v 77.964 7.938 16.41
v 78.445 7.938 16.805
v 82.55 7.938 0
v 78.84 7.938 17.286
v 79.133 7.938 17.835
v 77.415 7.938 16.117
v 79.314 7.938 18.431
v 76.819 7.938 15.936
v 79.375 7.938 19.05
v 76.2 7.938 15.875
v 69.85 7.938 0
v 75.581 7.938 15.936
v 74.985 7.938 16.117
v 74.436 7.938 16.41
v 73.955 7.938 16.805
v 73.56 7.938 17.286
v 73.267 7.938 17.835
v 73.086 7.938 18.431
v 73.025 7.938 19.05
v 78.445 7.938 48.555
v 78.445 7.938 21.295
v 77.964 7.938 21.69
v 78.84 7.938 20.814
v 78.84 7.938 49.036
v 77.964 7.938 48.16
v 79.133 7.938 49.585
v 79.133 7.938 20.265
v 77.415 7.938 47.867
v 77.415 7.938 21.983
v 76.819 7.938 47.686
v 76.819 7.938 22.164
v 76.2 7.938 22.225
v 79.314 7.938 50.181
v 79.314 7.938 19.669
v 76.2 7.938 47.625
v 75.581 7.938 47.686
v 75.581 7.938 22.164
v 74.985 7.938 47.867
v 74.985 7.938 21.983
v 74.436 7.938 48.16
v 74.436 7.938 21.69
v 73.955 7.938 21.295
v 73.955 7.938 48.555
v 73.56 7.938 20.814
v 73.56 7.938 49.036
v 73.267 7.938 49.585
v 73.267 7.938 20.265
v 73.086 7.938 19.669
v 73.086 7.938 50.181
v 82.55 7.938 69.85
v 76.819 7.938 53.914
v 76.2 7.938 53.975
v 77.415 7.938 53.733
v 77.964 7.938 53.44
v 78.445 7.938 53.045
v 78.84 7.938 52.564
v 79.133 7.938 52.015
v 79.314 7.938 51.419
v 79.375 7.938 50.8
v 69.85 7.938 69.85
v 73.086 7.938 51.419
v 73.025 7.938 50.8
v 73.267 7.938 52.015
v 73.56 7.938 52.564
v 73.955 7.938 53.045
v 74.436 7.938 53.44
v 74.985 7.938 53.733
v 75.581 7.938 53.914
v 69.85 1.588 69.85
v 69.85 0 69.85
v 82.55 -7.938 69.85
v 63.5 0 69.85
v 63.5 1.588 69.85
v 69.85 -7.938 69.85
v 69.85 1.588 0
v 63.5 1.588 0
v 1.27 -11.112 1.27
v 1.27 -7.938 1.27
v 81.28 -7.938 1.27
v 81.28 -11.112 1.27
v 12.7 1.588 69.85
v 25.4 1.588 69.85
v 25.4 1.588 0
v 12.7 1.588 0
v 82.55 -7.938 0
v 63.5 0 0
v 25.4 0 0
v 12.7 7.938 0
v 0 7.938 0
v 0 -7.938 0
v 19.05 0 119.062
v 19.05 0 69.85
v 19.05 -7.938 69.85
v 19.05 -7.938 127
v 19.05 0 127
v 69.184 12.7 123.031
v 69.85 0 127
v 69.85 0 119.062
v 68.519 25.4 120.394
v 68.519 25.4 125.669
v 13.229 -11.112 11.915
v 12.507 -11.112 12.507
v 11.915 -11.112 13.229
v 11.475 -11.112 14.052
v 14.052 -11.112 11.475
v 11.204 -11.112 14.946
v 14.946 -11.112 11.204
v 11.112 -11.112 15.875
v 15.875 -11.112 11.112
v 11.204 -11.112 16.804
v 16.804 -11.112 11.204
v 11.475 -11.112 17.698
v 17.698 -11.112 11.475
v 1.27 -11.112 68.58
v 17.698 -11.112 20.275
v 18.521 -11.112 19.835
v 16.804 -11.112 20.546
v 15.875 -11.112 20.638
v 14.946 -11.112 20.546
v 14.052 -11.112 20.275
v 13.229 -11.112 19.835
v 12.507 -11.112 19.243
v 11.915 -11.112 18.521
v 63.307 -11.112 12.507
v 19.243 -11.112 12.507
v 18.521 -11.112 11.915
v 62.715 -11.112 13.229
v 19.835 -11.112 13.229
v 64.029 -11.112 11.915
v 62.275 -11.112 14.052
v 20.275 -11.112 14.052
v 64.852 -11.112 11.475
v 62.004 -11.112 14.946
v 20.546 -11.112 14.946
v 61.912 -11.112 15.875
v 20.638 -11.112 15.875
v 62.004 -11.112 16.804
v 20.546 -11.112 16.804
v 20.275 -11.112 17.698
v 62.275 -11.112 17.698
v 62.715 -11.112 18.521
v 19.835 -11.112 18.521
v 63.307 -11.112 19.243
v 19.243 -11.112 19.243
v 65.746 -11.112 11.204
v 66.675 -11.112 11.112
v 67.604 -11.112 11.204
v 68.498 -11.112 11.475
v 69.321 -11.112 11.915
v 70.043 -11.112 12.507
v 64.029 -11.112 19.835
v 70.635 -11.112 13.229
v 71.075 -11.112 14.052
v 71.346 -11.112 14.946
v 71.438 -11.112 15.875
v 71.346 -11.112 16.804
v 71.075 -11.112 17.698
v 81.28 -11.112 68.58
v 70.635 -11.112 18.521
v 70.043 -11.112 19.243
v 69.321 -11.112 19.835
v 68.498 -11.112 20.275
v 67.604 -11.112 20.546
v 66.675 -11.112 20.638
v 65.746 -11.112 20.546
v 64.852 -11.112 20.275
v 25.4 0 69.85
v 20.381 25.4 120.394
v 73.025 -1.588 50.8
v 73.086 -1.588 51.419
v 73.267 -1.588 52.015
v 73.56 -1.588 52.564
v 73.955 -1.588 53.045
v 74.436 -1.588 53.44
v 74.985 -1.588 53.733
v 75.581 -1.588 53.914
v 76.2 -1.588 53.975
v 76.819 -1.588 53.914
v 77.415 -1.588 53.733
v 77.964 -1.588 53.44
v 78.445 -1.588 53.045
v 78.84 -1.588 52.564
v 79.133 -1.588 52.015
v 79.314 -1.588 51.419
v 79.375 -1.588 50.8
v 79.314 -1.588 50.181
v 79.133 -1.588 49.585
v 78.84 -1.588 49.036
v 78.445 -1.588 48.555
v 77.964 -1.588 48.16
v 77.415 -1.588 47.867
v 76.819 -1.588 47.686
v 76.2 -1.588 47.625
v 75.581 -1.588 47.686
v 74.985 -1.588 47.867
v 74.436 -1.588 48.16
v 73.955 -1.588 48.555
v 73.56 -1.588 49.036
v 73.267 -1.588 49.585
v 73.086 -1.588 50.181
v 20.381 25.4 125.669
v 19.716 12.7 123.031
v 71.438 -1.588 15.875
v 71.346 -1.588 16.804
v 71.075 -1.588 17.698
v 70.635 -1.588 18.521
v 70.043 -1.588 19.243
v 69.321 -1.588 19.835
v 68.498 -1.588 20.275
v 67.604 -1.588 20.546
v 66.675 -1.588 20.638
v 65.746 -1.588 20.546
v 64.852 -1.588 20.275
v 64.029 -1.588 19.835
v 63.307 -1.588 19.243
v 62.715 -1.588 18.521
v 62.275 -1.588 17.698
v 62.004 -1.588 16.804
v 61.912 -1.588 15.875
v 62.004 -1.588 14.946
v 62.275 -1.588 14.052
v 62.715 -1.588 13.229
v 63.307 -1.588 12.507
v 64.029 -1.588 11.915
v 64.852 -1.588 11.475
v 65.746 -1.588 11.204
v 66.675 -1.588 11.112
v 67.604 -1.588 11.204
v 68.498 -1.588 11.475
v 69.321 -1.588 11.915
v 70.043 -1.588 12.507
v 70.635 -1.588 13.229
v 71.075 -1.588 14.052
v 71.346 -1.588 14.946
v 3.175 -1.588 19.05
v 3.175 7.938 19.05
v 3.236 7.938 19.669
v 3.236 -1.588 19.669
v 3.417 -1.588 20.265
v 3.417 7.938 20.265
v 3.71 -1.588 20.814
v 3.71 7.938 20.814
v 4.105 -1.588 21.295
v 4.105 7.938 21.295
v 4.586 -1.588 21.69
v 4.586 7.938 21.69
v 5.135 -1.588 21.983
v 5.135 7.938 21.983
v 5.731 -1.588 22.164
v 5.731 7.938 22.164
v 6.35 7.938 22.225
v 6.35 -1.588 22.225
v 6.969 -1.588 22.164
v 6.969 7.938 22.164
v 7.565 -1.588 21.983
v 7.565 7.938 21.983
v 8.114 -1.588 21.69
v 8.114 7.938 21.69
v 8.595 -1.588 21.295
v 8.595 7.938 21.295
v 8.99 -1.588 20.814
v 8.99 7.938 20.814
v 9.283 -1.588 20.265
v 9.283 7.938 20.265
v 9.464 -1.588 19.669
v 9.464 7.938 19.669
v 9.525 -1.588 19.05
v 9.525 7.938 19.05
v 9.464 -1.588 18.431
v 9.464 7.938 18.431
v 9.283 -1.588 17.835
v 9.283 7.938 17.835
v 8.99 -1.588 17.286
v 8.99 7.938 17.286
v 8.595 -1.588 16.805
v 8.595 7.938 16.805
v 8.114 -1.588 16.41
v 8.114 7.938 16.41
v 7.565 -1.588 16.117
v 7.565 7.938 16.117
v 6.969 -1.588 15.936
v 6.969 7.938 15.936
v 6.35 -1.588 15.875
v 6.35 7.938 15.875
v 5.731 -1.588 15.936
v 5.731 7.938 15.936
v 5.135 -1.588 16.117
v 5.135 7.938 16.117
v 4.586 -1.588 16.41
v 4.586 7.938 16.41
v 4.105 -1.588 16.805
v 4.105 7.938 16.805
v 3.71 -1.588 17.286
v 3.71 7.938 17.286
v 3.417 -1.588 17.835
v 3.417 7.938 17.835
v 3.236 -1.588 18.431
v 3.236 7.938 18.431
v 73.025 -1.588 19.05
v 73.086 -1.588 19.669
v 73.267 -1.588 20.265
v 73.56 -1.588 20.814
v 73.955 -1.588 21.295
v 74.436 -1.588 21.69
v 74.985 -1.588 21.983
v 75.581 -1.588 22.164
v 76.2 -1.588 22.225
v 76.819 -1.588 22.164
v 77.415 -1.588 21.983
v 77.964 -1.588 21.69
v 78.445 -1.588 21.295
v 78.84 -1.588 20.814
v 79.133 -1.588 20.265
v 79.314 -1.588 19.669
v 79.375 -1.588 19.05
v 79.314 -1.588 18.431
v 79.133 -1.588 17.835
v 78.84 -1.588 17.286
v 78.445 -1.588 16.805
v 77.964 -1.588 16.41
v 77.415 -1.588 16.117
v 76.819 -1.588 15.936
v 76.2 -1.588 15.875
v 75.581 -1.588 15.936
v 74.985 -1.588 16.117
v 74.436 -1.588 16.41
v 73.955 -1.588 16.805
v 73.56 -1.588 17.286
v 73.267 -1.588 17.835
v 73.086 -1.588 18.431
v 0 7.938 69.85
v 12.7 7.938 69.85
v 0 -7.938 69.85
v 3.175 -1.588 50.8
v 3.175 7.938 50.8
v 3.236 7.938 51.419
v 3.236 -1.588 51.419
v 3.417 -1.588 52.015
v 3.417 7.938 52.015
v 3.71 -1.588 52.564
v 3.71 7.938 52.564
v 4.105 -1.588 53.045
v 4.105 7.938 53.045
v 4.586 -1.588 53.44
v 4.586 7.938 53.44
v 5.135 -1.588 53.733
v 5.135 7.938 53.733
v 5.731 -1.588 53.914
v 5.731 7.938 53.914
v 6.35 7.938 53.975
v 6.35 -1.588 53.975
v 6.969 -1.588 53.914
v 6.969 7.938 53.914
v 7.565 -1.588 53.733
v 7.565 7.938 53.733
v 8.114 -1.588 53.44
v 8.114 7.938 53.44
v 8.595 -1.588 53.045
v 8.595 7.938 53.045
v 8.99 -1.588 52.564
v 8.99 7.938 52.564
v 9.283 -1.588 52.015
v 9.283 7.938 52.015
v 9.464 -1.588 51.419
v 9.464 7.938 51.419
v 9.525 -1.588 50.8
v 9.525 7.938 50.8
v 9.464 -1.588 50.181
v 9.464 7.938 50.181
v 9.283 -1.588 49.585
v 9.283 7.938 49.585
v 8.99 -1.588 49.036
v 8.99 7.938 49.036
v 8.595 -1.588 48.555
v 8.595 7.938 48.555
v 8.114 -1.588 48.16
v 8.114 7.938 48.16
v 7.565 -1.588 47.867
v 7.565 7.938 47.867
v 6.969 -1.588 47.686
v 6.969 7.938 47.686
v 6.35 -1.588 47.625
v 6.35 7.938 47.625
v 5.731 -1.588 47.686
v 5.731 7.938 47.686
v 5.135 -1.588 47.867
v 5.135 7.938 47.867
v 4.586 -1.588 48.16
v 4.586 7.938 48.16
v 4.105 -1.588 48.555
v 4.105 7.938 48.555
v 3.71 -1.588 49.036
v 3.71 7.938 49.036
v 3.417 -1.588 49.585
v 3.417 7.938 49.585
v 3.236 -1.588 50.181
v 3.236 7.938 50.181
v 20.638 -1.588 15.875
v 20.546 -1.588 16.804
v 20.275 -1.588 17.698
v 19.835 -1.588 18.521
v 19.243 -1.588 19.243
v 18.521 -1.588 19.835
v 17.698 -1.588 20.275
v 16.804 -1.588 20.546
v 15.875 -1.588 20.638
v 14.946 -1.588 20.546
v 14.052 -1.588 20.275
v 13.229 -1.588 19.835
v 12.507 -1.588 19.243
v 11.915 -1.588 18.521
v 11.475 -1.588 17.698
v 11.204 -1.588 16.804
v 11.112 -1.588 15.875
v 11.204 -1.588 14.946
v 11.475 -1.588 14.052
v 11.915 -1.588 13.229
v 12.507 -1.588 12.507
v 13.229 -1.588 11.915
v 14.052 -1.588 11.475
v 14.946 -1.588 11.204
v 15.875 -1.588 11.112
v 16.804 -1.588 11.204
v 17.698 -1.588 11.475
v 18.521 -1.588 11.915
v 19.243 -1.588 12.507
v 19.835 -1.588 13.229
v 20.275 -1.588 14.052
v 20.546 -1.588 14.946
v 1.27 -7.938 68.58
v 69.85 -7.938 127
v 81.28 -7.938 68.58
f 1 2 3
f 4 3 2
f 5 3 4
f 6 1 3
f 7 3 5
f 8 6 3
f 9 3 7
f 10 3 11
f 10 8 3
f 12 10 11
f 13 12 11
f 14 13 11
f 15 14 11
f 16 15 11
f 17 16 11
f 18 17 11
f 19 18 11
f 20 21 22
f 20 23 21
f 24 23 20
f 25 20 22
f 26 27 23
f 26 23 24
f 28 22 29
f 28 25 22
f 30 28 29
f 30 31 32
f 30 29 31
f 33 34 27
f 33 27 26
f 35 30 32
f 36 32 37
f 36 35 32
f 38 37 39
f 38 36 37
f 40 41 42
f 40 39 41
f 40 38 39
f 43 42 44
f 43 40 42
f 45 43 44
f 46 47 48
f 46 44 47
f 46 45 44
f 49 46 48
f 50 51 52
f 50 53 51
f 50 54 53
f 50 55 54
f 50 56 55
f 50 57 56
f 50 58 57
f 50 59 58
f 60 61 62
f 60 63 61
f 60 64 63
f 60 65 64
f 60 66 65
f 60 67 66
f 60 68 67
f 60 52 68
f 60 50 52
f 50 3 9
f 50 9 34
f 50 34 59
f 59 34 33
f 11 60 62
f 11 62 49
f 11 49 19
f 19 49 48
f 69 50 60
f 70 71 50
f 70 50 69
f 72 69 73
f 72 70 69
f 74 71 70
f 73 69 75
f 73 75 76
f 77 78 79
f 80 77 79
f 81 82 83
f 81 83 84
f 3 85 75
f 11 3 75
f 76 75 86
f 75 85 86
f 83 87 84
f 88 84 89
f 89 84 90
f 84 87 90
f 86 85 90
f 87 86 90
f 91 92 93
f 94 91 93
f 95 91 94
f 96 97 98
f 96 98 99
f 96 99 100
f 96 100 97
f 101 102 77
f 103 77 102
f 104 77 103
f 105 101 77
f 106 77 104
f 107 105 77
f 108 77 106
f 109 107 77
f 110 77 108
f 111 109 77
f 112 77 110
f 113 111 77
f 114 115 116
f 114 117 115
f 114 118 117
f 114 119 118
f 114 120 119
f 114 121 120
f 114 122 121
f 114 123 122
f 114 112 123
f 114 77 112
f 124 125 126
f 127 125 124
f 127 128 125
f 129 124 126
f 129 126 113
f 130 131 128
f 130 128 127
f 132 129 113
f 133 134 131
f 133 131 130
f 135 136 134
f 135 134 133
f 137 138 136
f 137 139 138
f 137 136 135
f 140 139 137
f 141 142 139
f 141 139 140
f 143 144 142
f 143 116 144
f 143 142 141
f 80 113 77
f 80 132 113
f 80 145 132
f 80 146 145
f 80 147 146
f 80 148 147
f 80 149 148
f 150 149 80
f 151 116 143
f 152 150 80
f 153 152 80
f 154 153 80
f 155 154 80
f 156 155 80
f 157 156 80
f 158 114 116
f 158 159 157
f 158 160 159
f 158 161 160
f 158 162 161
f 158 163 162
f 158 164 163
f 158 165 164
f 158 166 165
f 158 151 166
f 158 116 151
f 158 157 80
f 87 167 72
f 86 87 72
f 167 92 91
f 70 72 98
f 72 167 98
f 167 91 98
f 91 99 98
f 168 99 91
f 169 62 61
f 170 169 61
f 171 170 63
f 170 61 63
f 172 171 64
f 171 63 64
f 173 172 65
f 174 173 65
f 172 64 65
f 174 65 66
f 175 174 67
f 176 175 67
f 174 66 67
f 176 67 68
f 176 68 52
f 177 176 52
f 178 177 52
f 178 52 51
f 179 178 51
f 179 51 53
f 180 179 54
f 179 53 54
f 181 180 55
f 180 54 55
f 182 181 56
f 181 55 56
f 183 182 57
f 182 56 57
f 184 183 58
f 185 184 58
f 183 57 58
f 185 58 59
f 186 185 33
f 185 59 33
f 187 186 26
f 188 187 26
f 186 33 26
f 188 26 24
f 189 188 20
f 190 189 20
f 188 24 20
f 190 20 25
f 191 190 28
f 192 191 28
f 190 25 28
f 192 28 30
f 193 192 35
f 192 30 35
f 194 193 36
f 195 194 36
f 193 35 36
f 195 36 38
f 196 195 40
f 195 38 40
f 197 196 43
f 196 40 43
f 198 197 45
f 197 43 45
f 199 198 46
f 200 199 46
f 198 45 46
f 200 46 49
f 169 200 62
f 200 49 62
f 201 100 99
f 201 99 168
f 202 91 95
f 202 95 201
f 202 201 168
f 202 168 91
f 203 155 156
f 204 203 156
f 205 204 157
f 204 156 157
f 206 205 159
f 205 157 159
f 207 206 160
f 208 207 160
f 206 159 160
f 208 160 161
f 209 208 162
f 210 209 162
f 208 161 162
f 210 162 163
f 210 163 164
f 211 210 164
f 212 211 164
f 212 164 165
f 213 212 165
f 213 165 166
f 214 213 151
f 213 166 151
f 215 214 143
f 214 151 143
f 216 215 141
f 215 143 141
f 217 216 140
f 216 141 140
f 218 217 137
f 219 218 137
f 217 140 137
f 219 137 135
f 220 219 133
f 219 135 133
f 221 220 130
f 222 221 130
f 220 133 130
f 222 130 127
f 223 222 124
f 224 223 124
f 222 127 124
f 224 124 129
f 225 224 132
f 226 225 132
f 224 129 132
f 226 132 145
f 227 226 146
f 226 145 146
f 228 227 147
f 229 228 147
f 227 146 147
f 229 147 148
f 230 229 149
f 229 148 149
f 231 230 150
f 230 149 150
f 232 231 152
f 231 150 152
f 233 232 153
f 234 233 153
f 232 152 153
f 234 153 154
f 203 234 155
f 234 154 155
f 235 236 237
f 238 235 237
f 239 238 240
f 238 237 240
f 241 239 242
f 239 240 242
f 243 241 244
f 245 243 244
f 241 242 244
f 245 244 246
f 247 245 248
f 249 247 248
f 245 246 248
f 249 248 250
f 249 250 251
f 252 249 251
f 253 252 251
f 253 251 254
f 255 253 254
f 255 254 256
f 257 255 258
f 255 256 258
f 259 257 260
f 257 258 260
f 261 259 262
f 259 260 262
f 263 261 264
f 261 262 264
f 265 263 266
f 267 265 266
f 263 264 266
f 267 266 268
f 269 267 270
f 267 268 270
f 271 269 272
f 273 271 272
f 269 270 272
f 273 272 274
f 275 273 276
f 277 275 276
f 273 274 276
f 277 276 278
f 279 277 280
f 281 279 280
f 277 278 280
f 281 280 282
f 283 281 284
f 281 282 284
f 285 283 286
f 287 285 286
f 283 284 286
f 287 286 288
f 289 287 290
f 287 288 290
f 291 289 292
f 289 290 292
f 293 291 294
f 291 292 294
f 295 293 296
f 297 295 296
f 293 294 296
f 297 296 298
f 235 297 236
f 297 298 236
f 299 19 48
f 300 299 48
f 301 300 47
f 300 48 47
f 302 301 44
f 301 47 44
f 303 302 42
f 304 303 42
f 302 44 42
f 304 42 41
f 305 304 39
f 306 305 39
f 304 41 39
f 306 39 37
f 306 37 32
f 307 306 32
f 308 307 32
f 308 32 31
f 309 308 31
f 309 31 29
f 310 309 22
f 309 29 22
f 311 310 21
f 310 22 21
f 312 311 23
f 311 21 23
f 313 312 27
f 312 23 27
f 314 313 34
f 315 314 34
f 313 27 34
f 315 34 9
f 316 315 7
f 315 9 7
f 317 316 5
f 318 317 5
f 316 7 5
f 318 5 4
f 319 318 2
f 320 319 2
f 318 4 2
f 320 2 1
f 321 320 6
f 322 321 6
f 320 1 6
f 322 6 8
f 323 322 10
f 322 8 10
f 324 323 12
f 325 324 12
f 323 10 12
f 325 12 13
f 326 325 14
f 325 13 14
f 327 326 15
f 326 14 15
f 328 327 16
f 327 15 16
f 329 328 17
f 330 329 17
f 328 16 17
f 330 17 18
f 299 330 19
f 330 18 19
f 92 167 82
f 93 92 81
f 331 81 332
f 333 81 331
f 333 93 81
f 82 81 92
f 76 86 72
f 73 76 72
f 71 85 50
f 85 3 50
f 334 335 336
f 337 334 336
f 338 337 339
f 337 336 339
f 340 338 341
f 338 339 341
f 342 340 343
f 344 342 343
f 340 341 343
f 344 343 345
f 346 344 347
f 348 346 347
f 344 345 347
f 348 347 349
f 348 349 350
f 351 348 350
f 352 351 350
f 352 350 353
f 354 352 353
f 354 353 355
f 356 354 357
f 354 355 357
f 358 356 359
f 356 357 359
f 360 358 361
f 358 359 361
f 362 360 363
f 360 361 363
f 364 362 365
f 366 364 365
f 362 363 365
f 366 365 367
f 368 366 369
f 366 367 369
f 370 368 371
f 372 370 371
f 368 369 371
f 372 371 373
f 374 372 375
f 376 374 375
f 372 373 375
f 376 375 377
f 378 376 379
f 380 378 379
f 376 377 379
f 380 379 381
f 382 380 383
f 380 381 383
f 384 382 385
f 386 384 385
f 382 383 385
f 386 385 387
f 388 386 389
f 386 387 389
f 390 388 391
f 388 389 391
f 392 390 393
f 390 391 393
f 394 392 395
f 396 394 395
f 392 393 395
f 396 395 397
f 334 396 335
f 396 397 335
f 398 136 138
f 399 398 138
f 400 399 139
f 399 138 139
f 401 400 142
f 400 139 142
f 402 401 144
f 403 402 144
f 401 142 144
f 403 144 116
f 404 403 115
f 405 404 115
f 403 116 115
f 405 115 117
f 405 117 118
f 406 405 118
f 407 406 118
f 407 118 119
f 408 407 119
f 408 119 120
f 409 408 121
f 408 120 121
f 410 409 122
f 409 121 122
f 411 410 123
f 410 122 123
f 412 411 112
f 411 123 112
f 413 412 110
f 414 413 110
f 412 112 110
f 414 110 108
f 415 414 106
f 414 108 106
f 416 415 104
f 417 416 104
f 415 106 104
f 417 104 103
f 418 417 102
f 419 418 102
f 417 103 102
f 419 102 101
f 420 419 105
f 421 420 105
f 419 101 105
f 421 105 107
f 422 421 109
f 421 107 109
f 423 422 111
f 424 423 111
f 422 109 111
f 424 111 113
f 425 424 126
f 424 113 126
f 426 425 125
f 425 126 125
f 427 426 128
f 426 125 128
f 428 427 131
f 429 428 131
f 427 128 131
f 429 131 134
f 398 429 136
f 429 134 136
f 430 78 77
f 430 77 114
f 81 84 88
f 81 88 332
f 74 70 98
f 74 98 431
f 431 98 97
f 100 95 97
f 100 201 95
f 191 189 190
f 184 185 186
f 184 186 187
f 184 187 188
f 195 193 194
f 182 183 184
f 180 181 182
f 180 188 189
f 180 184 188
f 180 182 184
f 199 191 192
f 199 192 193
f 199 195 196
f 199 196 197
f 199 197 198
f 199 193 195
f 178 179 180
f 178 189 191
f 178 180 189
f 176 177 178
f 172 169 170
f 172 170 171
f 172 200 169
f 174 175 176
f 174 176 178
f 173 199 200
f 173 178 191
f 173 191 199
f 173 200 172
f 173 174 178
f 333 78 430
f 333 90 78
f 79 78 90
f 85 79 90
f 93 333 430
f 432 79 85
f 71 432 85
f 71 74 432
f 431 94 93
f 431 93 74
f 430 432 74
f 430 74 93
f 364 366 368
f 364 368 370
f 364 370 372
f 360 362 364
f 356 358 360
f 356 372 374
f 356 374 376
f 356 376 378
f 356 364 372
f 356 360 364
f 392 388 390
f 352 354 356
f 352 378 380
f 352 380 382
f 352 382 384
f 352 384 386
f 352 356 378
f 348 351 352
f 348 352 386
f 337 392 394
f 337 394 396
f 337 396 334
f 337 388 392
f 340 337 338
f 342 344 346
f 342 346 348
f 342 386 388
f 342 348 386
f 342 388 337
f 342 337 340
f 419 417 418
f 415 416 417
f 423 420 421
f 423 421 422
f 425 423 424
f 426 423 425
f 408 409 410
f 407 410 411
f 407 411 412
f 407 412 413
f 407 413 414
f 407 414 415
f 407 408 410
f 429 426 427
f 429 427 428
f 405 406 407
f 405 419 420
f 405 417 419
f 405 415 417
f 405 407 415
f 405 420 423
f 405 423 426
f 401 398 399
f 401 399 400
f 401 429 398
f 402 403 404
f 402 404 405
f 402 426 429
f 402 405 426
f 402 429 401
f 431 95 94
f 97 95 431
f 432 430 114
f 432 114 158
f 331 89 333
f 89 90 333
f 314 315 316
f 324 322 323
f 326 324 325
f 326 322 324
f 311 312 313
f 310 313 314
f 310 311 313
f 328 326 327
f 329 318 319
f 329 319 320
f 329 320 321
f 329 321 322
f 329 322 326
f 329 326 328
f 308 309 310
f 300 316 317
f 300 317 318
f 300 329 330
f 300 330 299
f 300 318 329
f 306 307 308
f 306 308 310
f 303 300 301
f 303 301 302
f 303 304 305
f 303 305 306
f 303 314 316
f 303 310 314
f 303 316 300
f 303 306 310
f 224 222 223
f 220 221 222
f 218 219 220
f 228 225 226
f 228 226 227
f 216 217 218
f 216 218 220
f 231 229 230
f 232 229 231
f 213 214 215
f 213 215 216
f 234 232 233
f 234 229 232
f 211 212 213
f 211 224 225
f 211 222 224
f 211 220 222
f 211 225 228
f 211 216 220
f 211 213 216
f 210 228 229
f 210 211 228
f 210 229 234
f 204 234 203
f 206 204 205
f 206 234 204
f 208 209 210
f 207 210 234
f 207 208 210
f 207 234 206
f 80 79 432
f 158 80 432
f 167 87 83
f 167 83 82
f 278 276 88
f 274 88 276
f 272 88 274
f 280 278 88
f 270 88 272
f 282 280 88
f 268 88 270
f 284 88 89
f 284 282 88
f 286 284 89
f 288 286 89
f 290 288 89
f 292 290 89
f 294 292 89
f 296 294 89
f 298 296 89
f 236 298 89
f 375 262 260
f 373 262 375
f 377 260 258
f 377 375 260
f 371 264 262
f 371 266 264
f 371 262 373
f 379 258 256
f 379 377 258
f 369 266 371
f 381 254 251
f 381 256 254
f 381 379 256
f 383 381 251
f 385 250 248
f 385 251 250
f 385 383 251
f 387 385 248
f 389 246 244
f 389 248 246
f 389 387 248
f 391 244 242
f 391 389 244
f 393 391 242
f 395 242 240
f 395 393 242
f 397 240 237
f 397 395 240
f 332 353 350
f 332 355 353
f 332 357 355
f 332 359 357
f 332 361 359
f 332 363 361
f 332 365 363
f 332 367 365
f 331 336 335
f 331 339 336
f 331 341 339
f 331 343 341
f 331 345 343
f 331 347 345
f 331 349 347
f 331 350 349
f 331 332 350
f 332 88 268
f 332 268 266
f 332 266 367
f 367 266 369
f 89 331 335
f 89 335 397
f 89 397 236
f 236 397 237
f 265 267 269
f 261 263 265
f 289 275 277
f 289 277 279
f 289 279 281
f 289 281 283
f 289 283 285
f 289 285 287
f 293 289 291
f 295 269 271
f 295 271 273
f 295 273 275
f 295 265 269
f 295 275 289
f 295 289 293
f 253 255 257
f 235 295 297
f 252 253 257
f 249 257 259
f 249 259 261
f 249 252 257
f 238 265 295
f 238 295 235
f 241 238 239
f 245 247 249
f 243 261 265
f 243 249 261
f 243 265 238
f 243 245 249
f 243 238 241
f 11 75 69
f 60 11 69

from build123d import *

# Parameters (mm, degrees)
F0_W      = 50.8
F0_H      = 57.15
F1_DEPTH  = 7.9375
F2_W      = 12.7
F2_H      = 69.85
F3_DEPTH  = 7.9375
F4_W      = 12.7
F4_H      = 69.85
F4_W_2    = 6.35
F5_DEPTH  = 1.5875
F6_W      = 50.8
F6_H      = 7.9375
F7_DEPTH  = 25.4
F7_TAPER  = 3
F8_W      = 80.01
F8_H      = 67.31
F9_DEPTH  = 3.175
F10_R     = 4.7625
F11_DEPTH = 9.525
F12_R     = 3.175
F13_DEPTH = 9.525


with BuildPart() as f1:
    # F0 (on Front) → F1 (new body)
    with BuildSketch(Plane.XZ):
        Polygon((0, 69.85), (0, 0), (82.55, 0), (82.55, 69.85), (69.85, 69.85), (19.05, 69.85), align=None)
        with Locations((44.45, 98.425)):
            Rectangle(F0_W, F0_H)
    extrude(amount=F1_DEPTH)

    # F2 (on face) → F3 (join)
    with BuildSketch(Plane(origin=(0, 0, 0), x_dir=(-1, 0, 0), z_dir=(0, 1, 0))):
        with Locations((-6.35, 34.925)):
            Rectangle(F2_W, F2_H)
        with Locations((-76.2, 34.925)):
            Rectangle(F2_W, F2_H)
    extrude(amount=F3_DEPTH)

    # F4 (on face) → F5 (join)
    with BuildSketch(Plane(origin=(0, 0, 0), x_dir=(-1, 0, 0), z_dir=(0, 1, 0))):
        with Locations((-19.05, 34.925)):
            Rectangle(F4_W, F4_H)
        with Locations((-66.675, 34.925)):
            Rectangle(F4_W_2, F4_H)
    extrude(amount=F5_DEPTH)

    # F6 (on face) → F7 (join)
    with BuildSketch(Plane(origin=(0, 0, 0), x_dir=(-1, 0, 0), z_dir=(0, 1, 0))):
        with Locations((-44.45, 123.03125)):
            Rectangle(F6_W, F6_H)
    extrude(amount=F7_DEPTH, taper=F7_TAPER)

    # F8 (on face) → F9 (join)
    with BuildSketch(Plane.XZ.offset(7.9375)):
        with Locations((41.275, 34.925)):
            Rectangle(F8_W, F8_H)
    extrude(amount=F9_DEPTH)

    # F10 (on face) → F11 (cut)
    with BuildSketch(Plane.XZ.offset(11.1125)):
        with Locations((15.875, 15.875)):
            Circle(F10_R)
        with Locations((66.675, 15.875)):
            Circle(F10_R)
    extrude(amount=-F11_DEPTH, mode=Mode.SUBTRACT)

    # F12 (on face) → F13 (cut)
    with BuildSketch(Plane(origin=(0, 7.9375, 0), x_dir=(-1, 0, 0), z_dir=(0, 1, 0))):
        with Locations((-76.2, 50.8)):
            Circle(F12_R)
        with Locations((-76.2, 19.05)):
            Circle(F12_R)
        with Locations((-6.35, 50.8)):
            Circle(F12_R)
        with Locations((-6.35, 19.05)):
            Circle(F12_R)
    extrude(amount=-F13_DEPTH, mode=Mode.SUBTRACT)


solid = f1.part
